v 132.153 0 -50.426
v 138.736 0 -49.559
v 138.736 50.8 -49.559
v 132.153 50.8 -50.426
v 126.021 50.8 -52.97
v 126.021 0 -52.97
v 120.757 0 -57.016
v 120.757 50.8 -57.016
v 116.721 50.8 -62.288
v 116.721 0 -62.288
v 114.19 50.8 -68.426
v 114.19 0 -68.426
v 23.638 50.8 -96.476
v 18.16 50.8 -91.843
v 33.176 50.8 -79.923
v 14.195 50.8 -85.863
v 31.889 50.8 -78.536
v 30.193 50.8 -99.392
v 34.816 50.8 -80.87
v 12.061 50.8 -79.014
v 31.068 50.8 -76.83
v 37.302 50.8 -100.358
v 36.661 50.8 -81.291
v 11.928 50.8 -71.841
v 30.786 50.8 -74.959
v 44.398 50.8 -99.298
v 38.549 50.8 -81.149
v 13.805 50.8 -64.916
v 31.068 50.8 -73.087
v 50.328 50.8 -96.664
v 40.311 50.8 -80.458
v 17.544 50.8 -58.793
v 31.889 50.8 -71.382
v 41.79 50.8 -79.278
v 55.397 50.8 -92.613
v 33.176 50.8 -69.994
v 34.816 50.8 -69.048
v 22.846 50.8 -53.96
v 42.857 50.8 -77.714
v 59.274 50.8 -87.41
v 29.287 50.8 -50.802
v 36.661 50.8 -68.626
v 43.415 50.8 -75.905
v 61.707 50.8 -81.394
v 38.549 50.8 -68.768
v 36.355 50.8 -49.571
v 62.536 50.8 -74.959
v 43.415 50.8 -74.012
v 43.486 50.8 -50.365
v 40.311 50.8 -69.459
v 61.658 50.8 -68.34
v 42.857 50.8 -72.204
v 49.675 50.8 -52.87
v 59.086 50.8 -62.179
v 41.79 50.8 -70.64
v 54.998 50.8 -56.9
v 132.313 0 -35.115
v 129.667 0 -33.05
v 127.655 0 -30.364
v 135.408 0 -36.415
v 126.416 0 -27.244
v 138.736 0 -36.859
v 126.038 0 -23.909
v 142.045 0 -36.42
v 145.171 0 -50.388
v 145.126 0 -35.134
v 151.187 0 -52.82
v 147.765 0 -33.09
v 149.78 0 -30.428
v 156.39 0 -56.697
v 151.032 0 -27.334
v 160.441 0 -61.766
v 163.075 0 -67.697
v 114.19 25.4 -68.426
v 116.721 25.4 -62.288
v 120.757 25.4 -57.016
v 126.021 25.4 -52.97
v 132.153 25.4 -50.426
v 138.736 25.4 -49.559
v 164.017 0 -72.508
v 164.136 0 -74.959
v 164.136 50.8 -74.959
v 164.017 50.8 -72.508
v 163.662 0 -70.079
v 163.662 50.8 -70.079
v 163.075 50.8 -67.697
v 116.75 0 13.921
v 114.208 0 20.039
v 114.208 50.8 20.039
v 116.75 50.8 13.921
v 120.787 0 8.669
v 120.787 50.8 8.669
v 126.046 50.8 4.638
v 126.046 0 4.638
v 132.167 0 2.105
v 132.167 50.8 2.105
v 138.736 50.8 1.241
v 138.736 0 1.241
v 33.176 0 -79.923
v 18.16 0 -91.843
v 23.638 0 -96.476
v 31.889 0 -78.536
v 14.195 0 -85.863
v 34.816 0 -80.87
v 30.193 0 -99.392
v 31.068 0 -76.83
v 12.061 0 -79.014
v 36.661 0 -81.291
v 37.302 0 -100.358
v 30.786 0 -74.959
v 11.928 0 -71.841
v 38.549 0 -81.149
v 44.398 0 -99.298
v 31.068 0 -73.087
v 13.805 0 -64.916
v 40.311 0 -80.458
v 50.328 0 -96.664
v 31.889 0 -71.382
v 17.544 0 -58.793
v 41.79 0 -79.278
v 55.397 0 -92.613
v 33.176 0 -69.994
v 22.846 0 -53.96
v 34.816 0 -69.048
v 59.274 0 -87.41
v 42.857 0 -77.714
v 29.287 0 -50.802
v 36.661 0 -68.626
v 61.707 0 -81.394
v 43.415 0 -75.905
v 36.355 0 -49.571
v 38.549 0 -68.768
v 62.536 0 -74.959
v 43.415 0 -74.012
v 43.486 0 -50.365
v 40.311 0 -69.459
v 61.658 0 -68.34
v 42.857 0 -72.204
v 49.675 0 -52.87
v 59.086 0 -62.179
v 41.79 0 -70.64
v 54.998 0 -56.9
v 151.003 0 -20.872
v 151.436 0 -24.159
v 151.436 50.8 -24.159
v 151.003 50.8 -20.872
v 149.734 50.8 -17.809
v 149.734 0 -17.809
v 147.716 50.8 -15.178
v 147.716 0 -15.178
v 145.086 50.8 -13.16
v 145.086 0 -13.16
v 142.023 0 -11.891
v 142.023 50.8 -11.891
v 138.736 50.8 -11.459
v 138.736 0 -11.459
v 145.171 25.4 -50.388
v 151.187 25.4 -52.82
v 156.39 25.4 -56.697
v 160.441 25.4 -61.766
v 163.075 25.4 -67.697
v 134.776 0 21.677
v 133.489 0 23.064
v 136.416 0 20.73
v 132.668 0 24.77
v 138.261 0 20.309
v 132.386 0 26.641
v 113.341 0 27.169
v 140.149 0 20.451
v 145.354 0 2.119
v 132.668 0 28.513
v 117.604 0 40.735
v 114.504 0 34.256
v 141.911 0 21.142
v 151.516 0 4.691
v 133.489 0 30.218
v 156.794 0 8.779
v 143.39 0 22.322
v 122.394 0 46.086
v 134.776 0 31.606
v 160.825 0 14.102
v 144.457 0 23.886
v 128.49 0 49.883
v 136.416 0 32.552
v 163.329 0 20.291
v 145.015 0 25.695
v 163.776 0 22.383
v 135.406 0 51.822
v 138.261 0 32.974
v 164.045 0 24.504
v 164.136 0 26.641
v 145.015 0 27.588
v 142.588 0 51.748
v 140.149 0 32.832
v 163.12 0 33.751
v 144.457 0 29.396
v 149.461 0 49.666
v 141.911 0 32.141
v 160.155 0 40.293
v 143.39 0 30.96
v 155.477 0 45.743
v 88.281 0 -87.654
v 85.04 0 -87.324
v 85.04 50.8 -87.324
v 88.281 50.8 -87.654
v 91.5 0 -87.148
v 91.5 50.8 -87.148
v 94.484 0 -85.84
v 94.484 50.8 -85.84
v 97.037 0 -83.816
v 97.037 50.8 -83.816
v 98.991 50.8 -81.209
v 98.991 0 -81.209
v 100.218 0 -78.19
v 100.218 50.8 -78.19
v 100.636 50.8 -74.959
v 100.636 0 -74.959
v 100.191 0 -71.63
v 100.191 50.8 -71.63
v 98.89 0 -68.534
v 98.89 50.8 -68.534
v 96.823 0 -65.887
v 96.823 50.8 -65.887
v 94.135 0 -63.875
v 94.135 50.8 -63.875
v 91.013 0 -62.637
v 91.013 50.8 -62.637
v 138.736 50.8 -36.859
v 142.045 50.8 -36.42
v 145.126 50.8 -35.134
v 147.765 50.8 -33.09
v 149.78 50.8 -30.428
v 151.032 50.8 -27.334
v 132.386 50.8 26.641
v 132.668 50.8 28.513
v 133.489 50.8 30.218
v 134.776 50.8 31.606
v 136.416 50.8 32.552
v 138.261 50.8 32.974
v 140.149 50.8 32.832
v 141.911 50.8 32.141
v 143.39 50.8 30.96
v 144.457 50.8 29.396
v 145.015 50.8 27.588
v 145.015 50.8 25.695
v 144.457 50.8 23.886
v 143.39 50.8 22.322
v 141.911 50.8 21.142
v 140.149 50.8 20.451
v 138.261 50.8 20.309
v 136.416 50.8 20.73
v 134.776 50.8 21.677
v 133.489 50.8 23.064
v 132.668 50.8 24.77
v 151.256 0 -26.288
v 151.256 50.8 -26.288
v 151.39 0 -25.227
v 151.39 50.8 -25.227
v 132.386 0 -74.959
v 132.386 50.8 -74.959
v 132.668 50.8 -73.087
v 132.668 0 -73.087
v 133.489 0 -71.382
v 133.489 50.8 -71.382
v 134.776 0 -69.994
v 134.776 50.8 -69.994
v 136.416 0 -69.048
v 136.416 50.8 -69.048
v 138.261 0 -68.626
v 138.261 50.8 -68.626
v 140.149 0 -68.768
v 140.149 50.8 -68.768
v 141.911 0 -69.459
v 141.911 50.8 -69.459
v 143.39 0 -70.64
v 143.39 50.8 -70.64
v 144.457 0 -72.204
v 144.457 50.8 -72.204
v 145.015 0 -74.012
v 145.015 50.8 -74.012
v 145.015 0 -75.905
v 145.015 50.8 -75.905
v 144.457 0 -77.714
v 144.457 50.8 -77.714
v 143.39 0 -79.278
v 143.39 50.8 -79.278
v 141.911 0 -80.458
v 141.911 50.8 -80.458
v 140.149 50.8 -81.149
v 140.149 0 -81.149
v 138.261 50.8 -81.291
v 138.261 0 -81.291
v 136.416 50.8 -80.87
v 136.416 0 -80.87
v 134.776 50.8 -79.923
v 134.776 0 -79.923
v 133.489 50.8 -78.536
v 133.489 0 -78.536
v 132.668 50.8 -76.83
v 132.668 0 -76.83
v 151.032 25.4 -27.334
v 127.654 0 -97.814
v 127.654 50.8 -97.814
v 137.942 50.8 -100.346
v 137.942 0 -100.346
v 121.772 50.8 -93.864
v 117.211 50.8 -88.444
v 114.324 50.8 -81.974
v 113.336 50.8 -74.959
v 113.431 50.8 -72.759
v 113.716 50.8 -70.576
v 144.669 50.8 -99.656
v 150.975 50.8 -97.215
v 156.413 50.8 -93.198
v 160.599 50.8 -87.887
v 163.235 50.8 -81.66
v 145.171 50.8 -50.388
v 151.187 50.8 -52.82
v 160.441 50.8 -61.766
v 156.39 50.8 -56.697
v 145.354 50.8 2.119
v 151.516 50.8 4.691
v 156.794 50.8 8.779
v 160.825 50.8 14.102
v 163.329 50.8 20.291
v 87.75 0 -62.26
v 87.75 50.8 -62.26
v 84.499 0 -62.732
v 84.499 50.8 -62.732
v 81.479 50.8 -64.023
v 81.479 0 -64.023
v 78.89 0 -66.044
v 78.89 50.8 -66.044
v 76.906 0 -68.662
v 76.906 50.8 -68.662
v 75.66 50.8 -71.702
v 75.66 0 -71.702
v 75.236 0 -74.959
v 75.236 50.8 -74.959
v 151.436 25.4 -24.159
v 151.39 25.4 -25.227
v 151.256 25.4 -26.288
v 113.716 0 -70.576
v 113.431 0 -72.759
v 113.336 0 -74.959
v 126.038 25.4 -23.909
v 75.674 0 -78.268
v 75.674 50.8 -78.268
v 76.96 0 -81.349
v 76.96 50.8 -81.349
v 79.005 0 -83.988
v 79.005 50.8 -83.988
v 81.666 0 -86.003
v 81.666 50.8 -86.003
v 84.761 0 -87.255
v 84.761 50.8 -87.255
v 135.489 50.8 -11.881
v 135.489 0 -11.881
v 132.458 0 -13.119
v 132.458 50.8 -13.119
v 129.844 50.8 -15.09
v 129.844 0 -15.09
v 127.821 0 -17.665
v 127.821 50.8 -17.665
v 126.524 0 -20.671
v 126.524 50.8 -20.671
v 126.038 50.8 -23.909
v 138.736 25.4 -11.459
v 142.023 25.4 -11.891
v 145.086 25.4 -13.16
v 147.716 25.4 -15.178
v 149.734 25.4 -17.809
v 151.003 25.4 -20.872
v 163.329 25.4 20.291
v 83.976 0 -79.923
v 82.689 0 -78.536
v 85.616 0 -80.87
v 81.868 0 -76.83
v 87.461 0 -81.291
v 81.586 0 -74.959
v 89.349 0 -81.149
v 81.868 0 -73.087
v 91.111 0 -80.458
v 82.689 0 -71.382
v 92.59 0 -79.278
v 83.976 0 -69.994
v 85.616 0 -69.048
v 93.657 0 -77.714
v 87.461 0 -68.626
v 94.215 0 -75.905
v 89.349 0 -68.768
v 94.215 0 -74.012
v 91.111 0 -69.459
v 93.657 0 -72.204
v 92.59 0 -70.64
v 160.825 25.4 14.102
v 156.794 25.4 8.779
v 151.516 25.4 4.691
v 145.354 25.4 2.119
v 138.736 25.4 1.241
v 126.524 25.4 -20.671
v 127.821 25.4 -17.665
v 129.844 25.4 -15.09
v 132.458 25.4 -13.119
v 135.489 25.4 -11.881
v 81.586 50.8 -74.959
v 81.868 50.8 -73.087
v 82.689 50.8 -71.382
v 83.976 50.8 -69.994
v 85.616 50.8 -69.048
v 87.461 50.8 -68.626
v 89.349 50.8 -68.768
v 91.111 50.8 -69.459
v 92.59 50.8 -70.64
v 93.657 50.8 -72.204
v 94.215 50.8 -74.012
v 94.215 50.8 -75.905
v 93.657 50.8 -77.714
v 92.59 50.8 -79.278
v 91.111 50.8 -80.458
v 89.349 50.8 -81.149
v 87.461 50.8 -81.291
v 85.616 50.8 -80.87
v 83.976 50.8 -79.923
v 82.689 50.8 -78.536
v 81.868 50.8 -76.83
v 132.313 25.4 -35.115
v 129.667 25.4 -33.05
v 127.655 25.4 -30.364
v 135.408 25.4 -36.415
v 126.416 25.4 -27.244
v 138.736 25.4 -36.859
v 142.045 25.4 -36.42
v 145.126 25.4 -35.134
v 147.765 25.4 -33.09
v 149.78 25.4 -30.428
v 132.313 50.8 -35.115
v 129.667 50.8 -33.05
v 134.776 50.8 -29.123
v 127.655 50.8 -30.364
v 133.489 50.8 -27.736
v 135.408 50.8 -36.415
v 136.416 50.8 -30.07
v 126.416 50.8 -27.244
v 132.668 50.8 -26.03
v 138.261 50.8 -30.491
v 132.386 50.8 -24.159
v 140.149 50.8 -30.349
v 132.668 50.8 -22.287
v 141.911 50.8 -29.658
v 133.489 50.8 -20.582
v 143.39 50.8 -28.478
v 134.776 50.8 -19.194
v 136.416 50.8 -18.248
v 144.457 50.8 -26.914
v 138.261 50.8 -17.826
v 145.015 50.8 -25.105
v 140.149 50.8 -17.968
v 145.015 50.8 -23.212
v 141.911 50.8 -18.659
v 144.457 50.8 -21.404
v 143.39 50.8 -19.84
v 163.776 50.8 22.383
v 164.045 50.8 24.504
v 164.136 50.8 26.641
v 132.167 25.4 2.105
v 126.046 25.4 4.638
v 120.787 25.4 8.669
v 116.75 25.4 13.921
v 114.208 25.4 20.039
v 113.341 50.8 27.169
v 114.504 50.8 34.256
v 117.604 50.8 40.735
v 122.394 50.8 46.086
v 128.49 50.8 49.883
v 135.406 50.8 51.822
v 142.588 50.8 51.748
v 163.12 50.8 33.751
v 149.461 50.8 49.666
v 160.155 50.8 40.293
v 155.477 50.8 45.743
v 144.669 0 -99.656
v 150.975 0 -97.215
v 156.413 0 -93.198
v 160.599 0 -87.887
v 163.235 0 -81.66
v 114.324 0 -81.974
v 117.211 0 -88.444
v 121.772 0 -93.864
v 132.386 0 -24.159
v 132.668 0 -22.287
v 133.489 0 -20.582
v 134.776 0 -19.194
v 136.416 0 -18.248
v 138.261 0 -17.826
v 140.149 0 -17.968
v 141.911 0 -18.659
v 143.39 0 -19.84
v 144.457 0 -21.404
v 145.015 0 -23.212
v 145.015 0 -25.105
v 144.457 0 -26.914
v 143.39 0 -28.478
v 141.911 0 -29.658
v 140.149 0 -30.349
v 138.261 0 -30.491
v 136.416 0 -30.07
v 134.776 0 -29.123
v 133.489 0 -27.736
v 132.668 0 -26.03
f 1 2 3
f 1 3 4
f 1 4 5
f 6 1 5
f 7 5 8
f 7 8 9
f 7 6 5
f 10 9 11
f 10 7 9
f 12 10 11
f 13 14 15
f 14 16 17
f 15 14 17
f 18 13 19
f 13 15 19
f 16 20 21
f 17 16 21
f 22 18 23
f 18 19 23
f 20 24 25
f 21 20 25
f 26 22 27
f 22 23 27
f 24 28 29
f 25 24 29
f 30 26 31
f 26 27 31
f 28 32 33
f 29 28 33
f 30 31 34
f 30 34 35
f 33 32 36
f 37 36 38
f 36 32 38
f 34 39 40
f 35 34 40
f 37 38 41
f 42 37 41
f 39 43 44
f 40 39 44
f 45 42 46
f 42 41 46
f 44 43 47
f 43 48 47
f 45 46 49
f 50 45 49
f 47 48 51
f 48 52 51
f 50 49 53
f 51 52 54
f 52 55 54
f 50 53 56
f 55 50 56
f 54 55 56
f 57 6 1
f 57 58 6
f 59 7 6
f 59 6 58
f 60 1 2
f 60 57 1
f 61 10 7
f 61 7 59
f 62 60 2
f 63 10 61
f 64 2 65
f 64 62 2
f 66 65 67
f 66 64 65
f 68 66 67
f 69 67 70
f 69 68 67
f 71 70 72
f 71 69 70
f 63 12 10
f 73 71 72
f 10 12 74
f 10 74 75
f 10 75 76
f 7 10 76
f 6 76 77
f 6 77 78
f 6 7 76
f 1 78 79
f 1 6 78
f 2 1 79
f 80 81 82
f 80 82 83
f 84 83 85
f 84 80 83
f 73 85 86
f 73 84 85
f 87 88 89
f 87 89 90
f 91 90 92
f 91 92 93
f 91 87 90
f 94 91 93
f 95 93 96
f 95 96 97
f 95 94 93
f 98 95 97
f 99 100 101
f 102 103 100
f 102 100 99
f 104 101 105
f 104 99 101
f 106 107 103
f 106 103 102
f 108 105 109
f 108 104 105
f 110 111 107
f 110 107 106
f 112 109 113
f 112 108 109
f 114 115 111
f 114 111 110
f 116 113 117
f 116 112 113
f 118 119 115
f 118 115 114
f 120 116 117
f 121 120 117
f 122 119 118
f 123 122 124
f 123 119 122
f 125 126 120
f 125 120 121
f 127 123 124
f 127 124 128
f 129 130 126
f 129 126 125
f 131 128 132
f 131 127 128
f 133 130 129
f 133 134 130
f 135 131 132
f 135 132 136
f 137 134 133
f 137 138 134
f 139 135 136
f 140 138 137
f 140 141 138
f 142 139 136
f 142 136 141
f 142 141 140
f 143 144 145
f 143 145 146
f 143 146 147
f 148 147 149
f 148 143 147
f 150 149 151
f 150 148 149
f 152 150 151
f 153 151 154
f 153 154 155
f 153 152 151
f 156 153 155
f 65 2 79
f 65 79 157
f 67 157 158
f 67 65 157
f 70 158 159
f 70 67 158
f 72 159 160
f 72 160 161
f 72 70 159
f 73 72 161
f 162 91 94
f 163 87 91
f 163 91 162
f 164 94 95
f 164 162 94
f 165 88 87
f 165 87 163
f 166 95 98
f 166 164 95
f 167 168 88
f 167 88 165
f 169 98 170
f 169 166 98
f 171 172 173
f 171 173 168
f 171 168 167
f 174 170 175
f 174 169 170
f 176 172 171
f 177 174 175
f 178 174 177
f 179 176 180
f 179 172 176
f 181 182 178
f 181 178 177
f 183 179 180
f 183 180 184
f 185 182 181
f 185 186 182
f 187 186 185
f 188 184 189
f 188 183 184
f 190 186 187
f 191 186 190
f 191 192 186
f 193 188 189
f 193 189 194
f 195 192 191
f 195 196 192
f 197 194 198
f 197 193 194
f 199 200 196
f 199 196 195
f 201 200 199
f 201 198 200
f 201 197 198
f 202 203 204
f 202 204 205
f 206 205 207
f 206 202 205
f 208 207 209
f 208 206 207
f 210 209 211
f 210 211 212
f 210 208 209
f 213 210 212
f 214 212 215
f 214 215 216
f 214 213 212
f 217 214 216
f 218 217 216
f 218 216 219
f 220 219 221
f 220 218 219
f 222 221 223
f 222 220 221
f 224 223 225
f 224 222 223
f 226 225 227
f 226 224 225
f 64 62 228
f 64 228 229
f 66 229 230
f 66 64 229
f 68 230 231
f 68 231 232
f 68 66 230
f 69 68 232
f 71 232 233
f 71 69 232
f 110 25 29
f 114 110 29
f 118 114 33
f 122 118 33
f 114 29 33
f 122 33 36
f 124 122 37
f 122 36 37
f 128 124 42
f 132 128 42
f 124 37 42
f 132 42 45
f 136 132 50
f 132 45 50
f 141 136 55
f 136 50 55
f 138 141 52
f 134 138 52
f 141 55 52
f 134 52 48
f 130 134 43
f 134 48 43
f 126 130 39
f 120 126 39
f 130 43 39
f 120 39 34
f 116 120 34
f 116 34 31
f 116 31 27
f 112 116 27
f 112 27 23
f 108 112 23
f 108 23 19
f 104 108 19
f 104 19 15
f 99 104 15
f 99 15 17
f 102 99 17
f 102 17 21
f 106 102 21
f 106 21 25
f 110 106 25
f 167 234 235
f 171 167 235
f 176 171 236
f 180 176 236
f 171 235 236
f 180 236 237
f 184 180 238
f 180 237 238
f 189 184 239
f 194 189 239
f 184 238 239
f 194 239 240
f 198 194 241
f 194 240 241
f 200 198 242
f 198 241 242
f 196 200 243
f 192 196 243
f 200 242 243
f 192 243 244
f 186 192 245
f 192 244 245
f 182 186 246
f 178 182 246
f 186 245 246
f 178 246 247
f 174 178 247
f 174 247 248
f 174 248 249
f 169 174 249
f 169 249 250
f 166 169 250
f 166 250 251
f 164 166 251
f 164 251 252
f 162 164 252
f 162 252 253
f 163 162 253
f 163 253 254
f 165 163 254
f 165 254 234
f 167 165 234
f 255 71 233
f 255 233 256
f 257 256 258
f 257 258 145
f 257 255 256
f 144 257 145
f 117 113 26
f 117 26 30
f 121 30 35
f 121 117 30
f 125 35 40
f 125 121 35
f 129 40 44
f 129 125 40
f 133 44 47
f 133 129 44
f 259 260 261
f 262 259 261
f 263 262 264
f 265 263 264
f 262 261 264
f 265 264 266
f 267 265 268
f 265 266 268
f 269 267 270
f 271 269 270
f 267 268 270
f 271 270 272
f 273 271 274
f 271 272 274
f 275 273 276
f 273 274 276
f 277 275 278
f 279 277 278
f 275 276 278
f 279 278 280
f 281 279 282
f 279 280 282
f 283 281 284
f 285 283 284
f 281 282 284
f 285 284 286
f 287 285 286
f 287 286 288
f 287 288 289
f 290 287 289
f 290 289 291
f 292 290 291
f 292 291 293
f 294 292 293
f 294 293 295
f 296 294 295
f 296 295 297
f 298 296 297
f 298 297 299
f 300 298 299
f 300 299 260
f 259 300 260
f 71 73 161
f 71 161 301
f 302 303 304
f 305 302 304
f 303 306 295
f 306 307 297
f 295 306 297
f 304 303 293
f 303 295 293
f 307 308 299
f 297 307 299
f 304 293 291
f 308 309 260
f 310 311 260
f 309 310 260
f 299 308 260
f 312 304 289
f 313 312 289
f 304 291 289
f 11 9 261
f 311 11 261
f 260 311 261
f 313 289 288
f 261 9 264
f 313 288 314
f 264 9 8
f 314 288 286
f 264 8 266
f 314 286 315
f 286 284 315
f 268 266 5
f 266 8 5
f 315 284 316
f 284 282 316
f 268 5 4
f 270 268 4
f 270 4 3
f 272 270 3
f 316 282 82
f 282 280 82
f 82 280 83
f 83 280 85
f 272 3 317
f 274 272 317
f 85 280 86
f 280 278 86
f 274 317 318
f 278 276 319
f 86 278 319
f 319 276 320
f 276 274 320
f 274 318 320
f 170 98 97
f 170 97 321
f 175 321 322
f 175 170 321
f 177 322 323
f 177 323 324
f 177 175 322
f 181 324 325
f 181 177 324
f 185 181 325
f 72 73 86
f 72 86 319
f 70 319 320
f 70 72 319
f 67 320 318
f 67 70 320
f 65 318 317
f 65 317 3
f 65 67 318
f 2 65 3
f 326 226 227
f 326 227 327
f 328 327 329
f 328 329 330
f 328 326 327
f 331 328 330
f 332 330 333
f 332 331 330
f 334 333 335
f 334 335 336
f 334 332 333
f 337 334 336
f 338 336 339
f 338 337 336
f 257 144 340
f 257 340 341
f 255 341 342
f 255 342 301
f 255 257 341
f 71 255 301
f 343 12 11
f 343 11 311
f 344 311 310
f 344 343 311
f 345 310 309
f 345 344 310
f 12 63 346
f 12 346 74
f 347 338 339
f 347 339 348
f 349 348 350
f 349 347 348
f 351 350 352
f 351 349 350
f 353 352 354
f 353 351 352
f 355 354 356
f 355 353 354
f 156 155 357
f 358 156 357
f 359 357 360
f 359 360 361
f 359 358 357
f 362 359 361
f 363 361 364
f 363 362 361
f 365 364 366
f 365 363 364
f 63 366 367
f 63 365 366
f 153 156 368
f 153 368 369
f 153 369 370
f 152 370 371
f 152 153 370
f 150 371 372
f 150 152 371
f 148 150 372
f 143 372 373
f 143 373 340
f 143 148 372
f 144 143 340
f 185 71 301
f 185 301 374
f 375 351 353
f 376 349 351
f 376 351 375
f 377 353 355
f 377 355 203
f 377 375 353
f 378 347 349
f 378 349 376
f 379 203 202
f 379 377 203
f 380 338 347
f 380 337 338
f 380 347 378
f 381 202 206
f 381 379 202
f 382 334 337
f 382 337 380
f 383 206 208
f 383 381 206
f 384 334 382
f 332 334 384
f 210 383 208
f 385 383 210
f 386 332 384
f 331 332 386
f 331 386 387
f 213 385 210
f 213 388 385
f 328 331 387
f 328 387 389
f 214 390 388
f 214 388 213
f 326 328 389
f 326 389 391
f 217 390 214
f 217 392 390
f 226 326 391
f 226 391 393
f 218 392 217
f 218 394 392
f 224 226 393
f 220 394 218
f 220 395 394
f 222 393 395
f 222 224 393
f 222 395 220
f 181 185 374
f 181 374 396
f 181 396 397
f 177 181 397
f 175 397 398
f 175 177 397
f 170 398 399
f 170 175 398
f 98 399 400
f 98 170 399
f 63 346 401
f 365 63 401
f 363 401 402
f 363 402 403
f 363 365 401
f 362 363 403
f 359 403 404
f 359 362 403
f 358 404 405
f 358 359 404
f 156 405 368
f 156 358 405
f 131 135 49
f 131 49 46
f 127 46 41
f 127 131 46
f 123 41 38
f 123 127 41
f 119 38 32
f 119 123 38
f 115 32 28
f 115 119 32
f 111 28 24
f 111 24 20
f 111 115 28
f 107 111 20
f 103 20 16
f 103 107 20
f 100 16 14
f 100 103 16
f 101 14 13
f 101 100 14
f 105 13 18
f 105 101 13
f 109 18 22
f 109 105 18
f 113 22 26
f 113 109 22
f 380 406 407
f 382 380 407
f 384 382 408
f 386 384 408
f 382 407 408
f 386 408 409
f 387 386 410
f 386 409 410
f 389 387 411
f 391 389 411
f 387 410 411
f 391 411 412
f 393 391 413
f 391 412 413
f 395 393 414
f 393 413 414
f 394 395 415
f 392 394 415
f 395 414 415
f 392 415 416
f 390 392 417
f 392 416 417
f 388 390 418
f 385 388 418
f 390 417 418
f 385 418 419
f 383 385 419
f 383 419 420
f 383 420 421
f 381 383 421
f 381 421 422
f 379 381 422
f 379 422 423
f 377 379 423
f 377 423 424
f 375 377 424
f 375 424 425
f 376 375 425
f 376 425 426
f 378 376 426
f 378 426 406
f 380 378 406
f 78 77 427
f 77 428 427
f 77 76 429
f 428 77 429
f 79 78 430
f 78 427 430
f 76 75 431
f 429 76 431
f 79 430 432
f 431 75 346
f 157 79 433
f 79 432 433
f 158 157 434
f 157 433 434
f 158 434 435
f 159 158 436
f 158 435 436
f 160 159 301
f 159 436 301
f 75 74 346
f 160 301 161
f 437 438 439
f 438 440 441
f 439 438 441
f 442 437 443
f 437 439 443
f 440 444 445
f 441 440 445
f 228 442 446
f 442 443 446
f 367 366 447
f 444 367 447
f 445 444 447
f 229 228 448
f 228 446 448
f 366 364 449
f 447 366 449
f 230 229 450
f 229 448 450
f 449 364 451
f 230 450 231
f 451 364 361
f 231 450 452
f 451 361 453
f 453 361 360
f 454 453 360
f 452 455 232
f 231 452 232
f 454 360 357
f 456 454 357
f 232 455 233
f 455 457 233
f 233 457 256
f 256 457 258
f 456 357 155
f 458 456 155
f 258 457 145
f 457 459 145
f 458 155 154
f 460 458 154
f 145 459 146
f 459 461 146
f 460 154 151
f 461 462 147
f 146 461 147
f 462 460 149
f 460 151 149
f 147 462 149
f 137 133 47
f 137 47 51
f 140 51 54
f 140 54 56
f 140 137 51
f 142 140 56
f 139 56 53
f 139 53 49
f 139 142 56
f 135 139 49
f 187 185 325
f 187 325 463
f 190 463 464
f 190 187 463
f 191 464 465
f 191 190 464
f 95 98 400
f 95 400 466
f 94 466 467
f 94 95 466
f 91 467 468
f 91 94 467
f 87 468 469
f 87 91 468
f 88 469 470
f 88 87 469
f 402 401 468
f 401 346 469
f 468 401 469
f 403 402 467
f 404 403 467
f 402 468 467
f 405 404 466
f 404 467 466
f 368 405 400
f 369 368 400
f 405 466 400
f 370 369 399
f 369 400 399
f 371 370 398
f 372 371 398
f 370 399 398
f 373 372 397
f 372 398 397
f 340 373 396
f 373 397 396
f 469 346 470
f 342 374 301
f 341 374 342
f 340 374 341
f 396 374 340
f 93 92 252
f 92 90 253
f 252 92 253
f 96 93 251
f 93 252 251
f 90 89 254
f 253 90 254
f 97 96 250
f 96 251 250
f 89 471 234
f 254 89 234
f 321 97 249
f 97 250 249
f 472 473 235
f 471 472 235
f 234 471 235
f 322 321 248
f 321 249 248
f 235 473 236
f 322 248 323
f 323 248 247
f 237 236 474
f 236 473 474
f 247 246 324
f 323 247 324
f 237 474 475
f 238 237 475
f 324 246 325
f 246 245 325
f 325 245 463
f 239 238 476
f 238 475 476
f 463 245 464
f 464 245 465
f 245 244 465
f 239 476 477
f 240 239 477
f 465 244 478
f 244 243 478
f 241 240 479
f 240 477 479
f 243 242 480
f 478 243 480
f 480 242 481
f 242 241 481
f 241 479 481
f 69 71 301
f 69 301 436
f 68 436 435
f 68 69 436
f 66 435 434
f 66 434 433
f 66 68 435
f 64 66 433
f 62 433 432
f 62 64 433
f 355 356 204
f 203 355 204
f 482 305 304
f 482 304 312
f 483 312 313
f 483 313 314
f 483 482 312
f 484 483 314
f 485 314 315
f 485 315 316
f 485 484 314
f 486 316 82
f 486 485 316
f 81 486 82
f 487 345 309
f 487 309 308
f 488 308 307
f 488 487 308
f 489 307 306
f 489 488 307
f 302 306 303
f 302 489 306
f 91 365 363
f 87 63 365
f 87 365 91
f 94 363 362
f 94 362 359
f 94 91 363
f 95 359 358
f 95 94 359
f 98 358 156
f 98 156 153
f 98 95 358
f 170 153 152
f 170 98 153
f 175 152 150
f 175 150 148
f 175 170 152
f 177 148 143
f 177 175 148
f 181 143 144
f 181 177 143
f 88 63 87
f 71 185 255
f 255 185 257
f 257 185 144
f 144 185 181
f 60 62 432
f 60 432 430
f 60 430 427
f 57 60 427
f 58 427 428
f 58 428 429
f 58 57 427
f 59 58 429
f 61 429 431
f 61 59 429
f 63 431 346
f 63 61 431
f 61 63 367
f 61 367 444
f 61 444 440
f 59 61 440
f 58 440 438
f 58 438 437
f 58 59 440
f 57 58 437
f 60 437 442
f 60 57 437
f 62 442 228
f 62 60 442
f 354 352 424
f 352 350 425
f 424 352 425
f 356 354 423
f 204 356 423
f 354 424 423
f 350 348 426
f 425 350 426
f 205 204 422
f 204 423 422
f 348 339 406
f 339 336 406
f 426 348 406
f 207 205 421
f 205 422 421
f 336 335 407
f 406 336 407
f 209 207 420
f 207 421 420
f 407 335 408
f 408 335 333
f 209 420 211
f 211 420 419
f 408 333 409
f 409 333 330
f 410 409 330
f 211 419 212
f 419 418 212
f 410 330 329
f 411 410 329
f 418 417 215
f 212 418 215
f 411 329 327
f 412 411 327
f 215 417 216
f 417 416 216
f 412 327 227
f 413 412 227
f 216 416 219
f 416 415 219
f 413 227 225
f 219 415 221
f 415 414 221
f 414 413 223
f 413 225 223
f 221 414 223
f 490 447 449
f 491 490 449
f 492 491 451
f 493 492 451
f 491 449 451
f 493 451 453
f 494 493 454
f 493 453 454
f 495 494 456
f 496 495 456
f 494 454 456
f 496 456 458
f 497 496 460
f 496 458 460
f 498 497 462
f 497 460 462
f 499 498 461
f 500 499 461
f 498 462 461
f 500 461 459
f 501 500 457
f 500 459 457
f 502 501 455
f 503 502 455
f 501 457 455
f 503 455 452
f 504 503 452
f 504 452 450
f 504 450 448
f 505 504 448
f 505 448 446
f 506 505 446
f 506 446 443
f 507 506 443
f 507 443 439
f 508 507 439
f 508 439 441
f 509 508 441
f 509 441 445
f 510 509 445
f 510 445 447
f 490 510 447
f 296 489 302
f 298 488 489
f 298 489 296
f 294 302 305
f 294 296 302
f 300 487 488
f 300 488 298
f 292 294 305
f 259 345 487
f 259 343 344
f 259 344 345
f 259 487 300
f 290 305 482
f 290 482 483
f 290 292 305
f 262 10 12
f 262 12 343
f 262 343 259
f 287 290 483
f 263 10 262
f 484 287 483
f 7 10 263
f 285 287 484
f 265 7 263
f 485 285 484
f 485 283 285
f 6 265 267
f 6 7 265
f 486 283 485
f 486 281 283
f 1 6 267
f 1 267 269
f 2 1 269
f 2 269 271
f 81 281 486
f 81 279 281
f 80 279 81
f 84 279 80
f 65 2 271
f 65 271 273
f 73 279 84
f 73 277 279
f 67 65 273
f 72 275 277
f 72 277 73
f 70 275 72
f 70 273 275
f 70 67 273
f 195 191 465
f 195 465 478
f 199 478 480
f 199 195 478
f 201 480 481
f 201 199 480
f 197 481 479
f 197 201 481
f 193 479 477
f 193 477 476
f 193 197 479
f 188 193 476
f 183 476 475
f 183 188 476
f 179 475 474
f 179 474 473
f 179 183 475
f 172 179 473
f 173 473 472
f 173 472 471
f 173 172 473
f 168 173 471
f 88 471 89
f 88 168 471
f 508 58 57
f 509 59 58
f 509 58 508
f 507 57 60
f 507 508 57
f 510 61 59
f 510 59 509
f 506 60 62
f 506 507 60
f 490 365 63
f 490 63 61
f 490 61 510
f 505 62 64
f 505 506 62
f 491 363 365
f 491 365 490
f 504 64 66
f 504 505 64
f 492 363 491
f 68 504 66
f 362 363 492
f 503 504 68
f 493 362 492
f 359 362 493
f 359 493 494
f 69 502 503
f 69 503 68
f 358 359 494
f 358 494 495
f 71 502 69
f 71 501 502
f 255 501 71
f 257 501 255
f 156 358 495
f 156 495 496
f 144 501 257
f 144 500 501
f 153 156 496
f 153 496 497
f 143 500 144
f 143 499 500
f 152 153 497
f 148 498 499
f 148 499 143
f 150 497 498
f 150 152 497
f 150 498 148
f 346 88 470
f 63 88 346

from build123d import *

# Parameters (mm, degrees)
F1_DEPTH = 50.8
F2_DEPTH = 25.4
F3_D     = 12.7


with BuildPart() as f1:
    # F0 (on Front) → F1 (new body)
    with BuildSketch(Plane.XZ):
        with BuildLine():
            ThreePointArc((164.135504, 26.641296), (135.405806, 51.822104), (114.208488, 20.039367))
            ThreePointArc((114.208488, 20.039367), (123.284436, 6.481323), (138.735504, 1.241296))
            ThreePointArc((138.735504, 1.241296), (154.289764, 6.560832), (163.328948, 20.291296))
            ThreePointArc((163.328948, 20.291296), (163.933058, 23.440787), (164.135504, 26.641296))
        make_face()
        with BuildLine():
            ThreePointArc((138.735504, -11.458704), (129.844088, -15.090478), (126.037966, -23.908669))
            ThreePointArc((126.037966, -23.908669), (129.667278, -33.05012), (138.735504, -36.858704))
            Line((138.735504, -36.858704), (138.735504, -24.158704))
            Line((138.735504, -24.158704), (138.735504, -11.458704))
        make_face()
        with BuildLine():
            Line((138.735504, -24.158704), (138.735504, -36.858704))
            ThreePointArc((138.735504, -36.858704), (146.512634, -34.198936), (151.032226, -27.333704))
            ThreePointArc((151.032226, -27.333704), (151.334281, -25.758959), (151.435504, -24.158704))
            ThreePointArc((151.435504, -24.158704), (147.71576, -15.178448), (138.735504, -11.458704))
            Line((138.735504, -11.458704), (138.735504, -24.158704))
        make_face()
        with BuildLine():
            ThreePointArc((44.397689, -99.298398), (57.502383, -90.135998), (62.535504, -74.958704))
            ThreePointArc((62.535504, -74.958704), (57.21603, -59.404526), (43.485704, -50.365312))
            ThreePointArc((43.485704, -50.365312), (11.739914, -75.432012), (44.397689, -99.298398))
        make_face()
        with BuildLine():
            Line((100.635504, -74.958704), (87.935504, -74.958704))
            Line((87.935504, -74.958704), (75.235504, -74.958704))
            ThreePointArc((75.235504, -74.958704), (77.895273, -82.735834), (84.760504, -87.255427))
            Line((84.760504, -87.255427), (85.039791, -87.324174))
            ThreePointArc((85.039791, -87.324174), (95.825829, -84.910226), (100.635504, -74.958704))
        make_face()
        with BuildLine():
            Line((75.235504, -74.958704), (87.935504, -74.958704))
            Line((87.935504, -74.958704), (100.635504, -74.958704))
            ThreePointArc((100.635504, -74.958704), (97.944857, -67.141873), (91.013007, -62.63722))
            ThreePointArc((91.013007, -62.63722), (80.118672, -64.949352), (75.235504, -74.958704))
        make_face()
        with BuildLine():
            Line((138.735504, -74.958704), (113.335504, -74.958704))
            ThreePointArc((113.335504, -74.958704), (117.210692, -88.443601), (127.653807, -97.813813))
            Line((127.653807, -97.813813), (137.942033, -100.346308))
            ThreePointArc((137.942033, -100.346308), (156.413256, -93.197594), (164.135504, -74.958704))
            ThreePointArc((164.135504, -74.958704), (163.86903, -71.289114), (163.075198, -67.69652))
            ThreePointArc((163.075198, -67.69652), (153.912798, -54.591826), (138.735504, -49.558704))
            Line((138.735504, -49.558704), (138.735504, -74.958704))
        make_face()
        with BuildLine():
            ThreePointArc((114.189944, -68.426059), (113.55002, -71.664561), (113.335504, -74.958704))
            Line((113.335504, -74.958704), (138.735504, -74.958704))
            Line((138.735504, -74.958704), (138.735504, -49.558704))
            ThreePointArc((138.735504, -49.558704), (123.255989, -54.820566), (114.189944, -68.426059))
        make_face()
    extrude(amount=-F1_DEPTH)

    # F3 (through all)
    with Locations(Plane.XZ):
        with Locations((138.735504, -24.158704), (138.735504, 26.641296), (138.735504, -74.958704), (87.935504, -74.958704), (37.135504, -74.958704)):
            Hole(F3_D / 2)


with BuildPart() as f2:
    # F0 (on Front) → F2 (new body)
    with BuildSketch(Plane.XZ):
        with BuildLine():
            Line((114.208488, 20.039367), (126.037966, -23.908669))
            ThreePointArc((126.037966, -23.908669), (129.844088, -15.090478), (138.735504, -11.458704))
            Line((138.735504, -11.458704), (138.735504, 1.241296))
            ThreePointArc((138.735504, 1.241296), (123.284436, 6.481323), (114.208488, 20.039367))
        make_face()
        with BuildLine():
            Line((138.735504, 1.241296), (138.735504, -11.458704))
            ThreePointArc((138.735504, -11.458704), (147.71576, -15.178448), (151.435504, -24.158704))
            ThreePointArc((151.435504, -24.158704), (151.334281, -25.758959), (151.032226, -27.333704))
            Line((151.032226, -27.333704), (163.328948, 20.291296))
            ThreePointArc((163.328948, 20.291296), (154.289764, 6.560832), (138.735504, 1.241296))
        make_face()
        with BuildLine():
            Line((126.037966, -23.908669), (114.189944, -68.426059))
            ThreePointArc((114.189944, -68.426059), (123.255989, -54.820566), (138.735504, -49.558704))
            Line((138.735504, -49.558704), (138.735504, -36.858704))
            ThreePointArc((138.735504, -36.858704), (129.667278, -33.05012), (126.037966, -23.908669))
        make_face()
        with BuildLine():
            Line((138.735504, -36.858704), (138.735504, -49.558704))
            ThreePointArc((138.735504, -49.558704), (153.912798, -54.591826), (163.075198, -67.69652))
            Line((163.075198, -67.69652), (151.032226, -27.333704))
            ThreePointArc((151.032226, -27.333704), (146.512634, -34.198936), (138.735504, -36.858704))
        make_face()
    extrude(amount=-F2_DEPTH)


solid = Compound([f1.part, f2.part])
